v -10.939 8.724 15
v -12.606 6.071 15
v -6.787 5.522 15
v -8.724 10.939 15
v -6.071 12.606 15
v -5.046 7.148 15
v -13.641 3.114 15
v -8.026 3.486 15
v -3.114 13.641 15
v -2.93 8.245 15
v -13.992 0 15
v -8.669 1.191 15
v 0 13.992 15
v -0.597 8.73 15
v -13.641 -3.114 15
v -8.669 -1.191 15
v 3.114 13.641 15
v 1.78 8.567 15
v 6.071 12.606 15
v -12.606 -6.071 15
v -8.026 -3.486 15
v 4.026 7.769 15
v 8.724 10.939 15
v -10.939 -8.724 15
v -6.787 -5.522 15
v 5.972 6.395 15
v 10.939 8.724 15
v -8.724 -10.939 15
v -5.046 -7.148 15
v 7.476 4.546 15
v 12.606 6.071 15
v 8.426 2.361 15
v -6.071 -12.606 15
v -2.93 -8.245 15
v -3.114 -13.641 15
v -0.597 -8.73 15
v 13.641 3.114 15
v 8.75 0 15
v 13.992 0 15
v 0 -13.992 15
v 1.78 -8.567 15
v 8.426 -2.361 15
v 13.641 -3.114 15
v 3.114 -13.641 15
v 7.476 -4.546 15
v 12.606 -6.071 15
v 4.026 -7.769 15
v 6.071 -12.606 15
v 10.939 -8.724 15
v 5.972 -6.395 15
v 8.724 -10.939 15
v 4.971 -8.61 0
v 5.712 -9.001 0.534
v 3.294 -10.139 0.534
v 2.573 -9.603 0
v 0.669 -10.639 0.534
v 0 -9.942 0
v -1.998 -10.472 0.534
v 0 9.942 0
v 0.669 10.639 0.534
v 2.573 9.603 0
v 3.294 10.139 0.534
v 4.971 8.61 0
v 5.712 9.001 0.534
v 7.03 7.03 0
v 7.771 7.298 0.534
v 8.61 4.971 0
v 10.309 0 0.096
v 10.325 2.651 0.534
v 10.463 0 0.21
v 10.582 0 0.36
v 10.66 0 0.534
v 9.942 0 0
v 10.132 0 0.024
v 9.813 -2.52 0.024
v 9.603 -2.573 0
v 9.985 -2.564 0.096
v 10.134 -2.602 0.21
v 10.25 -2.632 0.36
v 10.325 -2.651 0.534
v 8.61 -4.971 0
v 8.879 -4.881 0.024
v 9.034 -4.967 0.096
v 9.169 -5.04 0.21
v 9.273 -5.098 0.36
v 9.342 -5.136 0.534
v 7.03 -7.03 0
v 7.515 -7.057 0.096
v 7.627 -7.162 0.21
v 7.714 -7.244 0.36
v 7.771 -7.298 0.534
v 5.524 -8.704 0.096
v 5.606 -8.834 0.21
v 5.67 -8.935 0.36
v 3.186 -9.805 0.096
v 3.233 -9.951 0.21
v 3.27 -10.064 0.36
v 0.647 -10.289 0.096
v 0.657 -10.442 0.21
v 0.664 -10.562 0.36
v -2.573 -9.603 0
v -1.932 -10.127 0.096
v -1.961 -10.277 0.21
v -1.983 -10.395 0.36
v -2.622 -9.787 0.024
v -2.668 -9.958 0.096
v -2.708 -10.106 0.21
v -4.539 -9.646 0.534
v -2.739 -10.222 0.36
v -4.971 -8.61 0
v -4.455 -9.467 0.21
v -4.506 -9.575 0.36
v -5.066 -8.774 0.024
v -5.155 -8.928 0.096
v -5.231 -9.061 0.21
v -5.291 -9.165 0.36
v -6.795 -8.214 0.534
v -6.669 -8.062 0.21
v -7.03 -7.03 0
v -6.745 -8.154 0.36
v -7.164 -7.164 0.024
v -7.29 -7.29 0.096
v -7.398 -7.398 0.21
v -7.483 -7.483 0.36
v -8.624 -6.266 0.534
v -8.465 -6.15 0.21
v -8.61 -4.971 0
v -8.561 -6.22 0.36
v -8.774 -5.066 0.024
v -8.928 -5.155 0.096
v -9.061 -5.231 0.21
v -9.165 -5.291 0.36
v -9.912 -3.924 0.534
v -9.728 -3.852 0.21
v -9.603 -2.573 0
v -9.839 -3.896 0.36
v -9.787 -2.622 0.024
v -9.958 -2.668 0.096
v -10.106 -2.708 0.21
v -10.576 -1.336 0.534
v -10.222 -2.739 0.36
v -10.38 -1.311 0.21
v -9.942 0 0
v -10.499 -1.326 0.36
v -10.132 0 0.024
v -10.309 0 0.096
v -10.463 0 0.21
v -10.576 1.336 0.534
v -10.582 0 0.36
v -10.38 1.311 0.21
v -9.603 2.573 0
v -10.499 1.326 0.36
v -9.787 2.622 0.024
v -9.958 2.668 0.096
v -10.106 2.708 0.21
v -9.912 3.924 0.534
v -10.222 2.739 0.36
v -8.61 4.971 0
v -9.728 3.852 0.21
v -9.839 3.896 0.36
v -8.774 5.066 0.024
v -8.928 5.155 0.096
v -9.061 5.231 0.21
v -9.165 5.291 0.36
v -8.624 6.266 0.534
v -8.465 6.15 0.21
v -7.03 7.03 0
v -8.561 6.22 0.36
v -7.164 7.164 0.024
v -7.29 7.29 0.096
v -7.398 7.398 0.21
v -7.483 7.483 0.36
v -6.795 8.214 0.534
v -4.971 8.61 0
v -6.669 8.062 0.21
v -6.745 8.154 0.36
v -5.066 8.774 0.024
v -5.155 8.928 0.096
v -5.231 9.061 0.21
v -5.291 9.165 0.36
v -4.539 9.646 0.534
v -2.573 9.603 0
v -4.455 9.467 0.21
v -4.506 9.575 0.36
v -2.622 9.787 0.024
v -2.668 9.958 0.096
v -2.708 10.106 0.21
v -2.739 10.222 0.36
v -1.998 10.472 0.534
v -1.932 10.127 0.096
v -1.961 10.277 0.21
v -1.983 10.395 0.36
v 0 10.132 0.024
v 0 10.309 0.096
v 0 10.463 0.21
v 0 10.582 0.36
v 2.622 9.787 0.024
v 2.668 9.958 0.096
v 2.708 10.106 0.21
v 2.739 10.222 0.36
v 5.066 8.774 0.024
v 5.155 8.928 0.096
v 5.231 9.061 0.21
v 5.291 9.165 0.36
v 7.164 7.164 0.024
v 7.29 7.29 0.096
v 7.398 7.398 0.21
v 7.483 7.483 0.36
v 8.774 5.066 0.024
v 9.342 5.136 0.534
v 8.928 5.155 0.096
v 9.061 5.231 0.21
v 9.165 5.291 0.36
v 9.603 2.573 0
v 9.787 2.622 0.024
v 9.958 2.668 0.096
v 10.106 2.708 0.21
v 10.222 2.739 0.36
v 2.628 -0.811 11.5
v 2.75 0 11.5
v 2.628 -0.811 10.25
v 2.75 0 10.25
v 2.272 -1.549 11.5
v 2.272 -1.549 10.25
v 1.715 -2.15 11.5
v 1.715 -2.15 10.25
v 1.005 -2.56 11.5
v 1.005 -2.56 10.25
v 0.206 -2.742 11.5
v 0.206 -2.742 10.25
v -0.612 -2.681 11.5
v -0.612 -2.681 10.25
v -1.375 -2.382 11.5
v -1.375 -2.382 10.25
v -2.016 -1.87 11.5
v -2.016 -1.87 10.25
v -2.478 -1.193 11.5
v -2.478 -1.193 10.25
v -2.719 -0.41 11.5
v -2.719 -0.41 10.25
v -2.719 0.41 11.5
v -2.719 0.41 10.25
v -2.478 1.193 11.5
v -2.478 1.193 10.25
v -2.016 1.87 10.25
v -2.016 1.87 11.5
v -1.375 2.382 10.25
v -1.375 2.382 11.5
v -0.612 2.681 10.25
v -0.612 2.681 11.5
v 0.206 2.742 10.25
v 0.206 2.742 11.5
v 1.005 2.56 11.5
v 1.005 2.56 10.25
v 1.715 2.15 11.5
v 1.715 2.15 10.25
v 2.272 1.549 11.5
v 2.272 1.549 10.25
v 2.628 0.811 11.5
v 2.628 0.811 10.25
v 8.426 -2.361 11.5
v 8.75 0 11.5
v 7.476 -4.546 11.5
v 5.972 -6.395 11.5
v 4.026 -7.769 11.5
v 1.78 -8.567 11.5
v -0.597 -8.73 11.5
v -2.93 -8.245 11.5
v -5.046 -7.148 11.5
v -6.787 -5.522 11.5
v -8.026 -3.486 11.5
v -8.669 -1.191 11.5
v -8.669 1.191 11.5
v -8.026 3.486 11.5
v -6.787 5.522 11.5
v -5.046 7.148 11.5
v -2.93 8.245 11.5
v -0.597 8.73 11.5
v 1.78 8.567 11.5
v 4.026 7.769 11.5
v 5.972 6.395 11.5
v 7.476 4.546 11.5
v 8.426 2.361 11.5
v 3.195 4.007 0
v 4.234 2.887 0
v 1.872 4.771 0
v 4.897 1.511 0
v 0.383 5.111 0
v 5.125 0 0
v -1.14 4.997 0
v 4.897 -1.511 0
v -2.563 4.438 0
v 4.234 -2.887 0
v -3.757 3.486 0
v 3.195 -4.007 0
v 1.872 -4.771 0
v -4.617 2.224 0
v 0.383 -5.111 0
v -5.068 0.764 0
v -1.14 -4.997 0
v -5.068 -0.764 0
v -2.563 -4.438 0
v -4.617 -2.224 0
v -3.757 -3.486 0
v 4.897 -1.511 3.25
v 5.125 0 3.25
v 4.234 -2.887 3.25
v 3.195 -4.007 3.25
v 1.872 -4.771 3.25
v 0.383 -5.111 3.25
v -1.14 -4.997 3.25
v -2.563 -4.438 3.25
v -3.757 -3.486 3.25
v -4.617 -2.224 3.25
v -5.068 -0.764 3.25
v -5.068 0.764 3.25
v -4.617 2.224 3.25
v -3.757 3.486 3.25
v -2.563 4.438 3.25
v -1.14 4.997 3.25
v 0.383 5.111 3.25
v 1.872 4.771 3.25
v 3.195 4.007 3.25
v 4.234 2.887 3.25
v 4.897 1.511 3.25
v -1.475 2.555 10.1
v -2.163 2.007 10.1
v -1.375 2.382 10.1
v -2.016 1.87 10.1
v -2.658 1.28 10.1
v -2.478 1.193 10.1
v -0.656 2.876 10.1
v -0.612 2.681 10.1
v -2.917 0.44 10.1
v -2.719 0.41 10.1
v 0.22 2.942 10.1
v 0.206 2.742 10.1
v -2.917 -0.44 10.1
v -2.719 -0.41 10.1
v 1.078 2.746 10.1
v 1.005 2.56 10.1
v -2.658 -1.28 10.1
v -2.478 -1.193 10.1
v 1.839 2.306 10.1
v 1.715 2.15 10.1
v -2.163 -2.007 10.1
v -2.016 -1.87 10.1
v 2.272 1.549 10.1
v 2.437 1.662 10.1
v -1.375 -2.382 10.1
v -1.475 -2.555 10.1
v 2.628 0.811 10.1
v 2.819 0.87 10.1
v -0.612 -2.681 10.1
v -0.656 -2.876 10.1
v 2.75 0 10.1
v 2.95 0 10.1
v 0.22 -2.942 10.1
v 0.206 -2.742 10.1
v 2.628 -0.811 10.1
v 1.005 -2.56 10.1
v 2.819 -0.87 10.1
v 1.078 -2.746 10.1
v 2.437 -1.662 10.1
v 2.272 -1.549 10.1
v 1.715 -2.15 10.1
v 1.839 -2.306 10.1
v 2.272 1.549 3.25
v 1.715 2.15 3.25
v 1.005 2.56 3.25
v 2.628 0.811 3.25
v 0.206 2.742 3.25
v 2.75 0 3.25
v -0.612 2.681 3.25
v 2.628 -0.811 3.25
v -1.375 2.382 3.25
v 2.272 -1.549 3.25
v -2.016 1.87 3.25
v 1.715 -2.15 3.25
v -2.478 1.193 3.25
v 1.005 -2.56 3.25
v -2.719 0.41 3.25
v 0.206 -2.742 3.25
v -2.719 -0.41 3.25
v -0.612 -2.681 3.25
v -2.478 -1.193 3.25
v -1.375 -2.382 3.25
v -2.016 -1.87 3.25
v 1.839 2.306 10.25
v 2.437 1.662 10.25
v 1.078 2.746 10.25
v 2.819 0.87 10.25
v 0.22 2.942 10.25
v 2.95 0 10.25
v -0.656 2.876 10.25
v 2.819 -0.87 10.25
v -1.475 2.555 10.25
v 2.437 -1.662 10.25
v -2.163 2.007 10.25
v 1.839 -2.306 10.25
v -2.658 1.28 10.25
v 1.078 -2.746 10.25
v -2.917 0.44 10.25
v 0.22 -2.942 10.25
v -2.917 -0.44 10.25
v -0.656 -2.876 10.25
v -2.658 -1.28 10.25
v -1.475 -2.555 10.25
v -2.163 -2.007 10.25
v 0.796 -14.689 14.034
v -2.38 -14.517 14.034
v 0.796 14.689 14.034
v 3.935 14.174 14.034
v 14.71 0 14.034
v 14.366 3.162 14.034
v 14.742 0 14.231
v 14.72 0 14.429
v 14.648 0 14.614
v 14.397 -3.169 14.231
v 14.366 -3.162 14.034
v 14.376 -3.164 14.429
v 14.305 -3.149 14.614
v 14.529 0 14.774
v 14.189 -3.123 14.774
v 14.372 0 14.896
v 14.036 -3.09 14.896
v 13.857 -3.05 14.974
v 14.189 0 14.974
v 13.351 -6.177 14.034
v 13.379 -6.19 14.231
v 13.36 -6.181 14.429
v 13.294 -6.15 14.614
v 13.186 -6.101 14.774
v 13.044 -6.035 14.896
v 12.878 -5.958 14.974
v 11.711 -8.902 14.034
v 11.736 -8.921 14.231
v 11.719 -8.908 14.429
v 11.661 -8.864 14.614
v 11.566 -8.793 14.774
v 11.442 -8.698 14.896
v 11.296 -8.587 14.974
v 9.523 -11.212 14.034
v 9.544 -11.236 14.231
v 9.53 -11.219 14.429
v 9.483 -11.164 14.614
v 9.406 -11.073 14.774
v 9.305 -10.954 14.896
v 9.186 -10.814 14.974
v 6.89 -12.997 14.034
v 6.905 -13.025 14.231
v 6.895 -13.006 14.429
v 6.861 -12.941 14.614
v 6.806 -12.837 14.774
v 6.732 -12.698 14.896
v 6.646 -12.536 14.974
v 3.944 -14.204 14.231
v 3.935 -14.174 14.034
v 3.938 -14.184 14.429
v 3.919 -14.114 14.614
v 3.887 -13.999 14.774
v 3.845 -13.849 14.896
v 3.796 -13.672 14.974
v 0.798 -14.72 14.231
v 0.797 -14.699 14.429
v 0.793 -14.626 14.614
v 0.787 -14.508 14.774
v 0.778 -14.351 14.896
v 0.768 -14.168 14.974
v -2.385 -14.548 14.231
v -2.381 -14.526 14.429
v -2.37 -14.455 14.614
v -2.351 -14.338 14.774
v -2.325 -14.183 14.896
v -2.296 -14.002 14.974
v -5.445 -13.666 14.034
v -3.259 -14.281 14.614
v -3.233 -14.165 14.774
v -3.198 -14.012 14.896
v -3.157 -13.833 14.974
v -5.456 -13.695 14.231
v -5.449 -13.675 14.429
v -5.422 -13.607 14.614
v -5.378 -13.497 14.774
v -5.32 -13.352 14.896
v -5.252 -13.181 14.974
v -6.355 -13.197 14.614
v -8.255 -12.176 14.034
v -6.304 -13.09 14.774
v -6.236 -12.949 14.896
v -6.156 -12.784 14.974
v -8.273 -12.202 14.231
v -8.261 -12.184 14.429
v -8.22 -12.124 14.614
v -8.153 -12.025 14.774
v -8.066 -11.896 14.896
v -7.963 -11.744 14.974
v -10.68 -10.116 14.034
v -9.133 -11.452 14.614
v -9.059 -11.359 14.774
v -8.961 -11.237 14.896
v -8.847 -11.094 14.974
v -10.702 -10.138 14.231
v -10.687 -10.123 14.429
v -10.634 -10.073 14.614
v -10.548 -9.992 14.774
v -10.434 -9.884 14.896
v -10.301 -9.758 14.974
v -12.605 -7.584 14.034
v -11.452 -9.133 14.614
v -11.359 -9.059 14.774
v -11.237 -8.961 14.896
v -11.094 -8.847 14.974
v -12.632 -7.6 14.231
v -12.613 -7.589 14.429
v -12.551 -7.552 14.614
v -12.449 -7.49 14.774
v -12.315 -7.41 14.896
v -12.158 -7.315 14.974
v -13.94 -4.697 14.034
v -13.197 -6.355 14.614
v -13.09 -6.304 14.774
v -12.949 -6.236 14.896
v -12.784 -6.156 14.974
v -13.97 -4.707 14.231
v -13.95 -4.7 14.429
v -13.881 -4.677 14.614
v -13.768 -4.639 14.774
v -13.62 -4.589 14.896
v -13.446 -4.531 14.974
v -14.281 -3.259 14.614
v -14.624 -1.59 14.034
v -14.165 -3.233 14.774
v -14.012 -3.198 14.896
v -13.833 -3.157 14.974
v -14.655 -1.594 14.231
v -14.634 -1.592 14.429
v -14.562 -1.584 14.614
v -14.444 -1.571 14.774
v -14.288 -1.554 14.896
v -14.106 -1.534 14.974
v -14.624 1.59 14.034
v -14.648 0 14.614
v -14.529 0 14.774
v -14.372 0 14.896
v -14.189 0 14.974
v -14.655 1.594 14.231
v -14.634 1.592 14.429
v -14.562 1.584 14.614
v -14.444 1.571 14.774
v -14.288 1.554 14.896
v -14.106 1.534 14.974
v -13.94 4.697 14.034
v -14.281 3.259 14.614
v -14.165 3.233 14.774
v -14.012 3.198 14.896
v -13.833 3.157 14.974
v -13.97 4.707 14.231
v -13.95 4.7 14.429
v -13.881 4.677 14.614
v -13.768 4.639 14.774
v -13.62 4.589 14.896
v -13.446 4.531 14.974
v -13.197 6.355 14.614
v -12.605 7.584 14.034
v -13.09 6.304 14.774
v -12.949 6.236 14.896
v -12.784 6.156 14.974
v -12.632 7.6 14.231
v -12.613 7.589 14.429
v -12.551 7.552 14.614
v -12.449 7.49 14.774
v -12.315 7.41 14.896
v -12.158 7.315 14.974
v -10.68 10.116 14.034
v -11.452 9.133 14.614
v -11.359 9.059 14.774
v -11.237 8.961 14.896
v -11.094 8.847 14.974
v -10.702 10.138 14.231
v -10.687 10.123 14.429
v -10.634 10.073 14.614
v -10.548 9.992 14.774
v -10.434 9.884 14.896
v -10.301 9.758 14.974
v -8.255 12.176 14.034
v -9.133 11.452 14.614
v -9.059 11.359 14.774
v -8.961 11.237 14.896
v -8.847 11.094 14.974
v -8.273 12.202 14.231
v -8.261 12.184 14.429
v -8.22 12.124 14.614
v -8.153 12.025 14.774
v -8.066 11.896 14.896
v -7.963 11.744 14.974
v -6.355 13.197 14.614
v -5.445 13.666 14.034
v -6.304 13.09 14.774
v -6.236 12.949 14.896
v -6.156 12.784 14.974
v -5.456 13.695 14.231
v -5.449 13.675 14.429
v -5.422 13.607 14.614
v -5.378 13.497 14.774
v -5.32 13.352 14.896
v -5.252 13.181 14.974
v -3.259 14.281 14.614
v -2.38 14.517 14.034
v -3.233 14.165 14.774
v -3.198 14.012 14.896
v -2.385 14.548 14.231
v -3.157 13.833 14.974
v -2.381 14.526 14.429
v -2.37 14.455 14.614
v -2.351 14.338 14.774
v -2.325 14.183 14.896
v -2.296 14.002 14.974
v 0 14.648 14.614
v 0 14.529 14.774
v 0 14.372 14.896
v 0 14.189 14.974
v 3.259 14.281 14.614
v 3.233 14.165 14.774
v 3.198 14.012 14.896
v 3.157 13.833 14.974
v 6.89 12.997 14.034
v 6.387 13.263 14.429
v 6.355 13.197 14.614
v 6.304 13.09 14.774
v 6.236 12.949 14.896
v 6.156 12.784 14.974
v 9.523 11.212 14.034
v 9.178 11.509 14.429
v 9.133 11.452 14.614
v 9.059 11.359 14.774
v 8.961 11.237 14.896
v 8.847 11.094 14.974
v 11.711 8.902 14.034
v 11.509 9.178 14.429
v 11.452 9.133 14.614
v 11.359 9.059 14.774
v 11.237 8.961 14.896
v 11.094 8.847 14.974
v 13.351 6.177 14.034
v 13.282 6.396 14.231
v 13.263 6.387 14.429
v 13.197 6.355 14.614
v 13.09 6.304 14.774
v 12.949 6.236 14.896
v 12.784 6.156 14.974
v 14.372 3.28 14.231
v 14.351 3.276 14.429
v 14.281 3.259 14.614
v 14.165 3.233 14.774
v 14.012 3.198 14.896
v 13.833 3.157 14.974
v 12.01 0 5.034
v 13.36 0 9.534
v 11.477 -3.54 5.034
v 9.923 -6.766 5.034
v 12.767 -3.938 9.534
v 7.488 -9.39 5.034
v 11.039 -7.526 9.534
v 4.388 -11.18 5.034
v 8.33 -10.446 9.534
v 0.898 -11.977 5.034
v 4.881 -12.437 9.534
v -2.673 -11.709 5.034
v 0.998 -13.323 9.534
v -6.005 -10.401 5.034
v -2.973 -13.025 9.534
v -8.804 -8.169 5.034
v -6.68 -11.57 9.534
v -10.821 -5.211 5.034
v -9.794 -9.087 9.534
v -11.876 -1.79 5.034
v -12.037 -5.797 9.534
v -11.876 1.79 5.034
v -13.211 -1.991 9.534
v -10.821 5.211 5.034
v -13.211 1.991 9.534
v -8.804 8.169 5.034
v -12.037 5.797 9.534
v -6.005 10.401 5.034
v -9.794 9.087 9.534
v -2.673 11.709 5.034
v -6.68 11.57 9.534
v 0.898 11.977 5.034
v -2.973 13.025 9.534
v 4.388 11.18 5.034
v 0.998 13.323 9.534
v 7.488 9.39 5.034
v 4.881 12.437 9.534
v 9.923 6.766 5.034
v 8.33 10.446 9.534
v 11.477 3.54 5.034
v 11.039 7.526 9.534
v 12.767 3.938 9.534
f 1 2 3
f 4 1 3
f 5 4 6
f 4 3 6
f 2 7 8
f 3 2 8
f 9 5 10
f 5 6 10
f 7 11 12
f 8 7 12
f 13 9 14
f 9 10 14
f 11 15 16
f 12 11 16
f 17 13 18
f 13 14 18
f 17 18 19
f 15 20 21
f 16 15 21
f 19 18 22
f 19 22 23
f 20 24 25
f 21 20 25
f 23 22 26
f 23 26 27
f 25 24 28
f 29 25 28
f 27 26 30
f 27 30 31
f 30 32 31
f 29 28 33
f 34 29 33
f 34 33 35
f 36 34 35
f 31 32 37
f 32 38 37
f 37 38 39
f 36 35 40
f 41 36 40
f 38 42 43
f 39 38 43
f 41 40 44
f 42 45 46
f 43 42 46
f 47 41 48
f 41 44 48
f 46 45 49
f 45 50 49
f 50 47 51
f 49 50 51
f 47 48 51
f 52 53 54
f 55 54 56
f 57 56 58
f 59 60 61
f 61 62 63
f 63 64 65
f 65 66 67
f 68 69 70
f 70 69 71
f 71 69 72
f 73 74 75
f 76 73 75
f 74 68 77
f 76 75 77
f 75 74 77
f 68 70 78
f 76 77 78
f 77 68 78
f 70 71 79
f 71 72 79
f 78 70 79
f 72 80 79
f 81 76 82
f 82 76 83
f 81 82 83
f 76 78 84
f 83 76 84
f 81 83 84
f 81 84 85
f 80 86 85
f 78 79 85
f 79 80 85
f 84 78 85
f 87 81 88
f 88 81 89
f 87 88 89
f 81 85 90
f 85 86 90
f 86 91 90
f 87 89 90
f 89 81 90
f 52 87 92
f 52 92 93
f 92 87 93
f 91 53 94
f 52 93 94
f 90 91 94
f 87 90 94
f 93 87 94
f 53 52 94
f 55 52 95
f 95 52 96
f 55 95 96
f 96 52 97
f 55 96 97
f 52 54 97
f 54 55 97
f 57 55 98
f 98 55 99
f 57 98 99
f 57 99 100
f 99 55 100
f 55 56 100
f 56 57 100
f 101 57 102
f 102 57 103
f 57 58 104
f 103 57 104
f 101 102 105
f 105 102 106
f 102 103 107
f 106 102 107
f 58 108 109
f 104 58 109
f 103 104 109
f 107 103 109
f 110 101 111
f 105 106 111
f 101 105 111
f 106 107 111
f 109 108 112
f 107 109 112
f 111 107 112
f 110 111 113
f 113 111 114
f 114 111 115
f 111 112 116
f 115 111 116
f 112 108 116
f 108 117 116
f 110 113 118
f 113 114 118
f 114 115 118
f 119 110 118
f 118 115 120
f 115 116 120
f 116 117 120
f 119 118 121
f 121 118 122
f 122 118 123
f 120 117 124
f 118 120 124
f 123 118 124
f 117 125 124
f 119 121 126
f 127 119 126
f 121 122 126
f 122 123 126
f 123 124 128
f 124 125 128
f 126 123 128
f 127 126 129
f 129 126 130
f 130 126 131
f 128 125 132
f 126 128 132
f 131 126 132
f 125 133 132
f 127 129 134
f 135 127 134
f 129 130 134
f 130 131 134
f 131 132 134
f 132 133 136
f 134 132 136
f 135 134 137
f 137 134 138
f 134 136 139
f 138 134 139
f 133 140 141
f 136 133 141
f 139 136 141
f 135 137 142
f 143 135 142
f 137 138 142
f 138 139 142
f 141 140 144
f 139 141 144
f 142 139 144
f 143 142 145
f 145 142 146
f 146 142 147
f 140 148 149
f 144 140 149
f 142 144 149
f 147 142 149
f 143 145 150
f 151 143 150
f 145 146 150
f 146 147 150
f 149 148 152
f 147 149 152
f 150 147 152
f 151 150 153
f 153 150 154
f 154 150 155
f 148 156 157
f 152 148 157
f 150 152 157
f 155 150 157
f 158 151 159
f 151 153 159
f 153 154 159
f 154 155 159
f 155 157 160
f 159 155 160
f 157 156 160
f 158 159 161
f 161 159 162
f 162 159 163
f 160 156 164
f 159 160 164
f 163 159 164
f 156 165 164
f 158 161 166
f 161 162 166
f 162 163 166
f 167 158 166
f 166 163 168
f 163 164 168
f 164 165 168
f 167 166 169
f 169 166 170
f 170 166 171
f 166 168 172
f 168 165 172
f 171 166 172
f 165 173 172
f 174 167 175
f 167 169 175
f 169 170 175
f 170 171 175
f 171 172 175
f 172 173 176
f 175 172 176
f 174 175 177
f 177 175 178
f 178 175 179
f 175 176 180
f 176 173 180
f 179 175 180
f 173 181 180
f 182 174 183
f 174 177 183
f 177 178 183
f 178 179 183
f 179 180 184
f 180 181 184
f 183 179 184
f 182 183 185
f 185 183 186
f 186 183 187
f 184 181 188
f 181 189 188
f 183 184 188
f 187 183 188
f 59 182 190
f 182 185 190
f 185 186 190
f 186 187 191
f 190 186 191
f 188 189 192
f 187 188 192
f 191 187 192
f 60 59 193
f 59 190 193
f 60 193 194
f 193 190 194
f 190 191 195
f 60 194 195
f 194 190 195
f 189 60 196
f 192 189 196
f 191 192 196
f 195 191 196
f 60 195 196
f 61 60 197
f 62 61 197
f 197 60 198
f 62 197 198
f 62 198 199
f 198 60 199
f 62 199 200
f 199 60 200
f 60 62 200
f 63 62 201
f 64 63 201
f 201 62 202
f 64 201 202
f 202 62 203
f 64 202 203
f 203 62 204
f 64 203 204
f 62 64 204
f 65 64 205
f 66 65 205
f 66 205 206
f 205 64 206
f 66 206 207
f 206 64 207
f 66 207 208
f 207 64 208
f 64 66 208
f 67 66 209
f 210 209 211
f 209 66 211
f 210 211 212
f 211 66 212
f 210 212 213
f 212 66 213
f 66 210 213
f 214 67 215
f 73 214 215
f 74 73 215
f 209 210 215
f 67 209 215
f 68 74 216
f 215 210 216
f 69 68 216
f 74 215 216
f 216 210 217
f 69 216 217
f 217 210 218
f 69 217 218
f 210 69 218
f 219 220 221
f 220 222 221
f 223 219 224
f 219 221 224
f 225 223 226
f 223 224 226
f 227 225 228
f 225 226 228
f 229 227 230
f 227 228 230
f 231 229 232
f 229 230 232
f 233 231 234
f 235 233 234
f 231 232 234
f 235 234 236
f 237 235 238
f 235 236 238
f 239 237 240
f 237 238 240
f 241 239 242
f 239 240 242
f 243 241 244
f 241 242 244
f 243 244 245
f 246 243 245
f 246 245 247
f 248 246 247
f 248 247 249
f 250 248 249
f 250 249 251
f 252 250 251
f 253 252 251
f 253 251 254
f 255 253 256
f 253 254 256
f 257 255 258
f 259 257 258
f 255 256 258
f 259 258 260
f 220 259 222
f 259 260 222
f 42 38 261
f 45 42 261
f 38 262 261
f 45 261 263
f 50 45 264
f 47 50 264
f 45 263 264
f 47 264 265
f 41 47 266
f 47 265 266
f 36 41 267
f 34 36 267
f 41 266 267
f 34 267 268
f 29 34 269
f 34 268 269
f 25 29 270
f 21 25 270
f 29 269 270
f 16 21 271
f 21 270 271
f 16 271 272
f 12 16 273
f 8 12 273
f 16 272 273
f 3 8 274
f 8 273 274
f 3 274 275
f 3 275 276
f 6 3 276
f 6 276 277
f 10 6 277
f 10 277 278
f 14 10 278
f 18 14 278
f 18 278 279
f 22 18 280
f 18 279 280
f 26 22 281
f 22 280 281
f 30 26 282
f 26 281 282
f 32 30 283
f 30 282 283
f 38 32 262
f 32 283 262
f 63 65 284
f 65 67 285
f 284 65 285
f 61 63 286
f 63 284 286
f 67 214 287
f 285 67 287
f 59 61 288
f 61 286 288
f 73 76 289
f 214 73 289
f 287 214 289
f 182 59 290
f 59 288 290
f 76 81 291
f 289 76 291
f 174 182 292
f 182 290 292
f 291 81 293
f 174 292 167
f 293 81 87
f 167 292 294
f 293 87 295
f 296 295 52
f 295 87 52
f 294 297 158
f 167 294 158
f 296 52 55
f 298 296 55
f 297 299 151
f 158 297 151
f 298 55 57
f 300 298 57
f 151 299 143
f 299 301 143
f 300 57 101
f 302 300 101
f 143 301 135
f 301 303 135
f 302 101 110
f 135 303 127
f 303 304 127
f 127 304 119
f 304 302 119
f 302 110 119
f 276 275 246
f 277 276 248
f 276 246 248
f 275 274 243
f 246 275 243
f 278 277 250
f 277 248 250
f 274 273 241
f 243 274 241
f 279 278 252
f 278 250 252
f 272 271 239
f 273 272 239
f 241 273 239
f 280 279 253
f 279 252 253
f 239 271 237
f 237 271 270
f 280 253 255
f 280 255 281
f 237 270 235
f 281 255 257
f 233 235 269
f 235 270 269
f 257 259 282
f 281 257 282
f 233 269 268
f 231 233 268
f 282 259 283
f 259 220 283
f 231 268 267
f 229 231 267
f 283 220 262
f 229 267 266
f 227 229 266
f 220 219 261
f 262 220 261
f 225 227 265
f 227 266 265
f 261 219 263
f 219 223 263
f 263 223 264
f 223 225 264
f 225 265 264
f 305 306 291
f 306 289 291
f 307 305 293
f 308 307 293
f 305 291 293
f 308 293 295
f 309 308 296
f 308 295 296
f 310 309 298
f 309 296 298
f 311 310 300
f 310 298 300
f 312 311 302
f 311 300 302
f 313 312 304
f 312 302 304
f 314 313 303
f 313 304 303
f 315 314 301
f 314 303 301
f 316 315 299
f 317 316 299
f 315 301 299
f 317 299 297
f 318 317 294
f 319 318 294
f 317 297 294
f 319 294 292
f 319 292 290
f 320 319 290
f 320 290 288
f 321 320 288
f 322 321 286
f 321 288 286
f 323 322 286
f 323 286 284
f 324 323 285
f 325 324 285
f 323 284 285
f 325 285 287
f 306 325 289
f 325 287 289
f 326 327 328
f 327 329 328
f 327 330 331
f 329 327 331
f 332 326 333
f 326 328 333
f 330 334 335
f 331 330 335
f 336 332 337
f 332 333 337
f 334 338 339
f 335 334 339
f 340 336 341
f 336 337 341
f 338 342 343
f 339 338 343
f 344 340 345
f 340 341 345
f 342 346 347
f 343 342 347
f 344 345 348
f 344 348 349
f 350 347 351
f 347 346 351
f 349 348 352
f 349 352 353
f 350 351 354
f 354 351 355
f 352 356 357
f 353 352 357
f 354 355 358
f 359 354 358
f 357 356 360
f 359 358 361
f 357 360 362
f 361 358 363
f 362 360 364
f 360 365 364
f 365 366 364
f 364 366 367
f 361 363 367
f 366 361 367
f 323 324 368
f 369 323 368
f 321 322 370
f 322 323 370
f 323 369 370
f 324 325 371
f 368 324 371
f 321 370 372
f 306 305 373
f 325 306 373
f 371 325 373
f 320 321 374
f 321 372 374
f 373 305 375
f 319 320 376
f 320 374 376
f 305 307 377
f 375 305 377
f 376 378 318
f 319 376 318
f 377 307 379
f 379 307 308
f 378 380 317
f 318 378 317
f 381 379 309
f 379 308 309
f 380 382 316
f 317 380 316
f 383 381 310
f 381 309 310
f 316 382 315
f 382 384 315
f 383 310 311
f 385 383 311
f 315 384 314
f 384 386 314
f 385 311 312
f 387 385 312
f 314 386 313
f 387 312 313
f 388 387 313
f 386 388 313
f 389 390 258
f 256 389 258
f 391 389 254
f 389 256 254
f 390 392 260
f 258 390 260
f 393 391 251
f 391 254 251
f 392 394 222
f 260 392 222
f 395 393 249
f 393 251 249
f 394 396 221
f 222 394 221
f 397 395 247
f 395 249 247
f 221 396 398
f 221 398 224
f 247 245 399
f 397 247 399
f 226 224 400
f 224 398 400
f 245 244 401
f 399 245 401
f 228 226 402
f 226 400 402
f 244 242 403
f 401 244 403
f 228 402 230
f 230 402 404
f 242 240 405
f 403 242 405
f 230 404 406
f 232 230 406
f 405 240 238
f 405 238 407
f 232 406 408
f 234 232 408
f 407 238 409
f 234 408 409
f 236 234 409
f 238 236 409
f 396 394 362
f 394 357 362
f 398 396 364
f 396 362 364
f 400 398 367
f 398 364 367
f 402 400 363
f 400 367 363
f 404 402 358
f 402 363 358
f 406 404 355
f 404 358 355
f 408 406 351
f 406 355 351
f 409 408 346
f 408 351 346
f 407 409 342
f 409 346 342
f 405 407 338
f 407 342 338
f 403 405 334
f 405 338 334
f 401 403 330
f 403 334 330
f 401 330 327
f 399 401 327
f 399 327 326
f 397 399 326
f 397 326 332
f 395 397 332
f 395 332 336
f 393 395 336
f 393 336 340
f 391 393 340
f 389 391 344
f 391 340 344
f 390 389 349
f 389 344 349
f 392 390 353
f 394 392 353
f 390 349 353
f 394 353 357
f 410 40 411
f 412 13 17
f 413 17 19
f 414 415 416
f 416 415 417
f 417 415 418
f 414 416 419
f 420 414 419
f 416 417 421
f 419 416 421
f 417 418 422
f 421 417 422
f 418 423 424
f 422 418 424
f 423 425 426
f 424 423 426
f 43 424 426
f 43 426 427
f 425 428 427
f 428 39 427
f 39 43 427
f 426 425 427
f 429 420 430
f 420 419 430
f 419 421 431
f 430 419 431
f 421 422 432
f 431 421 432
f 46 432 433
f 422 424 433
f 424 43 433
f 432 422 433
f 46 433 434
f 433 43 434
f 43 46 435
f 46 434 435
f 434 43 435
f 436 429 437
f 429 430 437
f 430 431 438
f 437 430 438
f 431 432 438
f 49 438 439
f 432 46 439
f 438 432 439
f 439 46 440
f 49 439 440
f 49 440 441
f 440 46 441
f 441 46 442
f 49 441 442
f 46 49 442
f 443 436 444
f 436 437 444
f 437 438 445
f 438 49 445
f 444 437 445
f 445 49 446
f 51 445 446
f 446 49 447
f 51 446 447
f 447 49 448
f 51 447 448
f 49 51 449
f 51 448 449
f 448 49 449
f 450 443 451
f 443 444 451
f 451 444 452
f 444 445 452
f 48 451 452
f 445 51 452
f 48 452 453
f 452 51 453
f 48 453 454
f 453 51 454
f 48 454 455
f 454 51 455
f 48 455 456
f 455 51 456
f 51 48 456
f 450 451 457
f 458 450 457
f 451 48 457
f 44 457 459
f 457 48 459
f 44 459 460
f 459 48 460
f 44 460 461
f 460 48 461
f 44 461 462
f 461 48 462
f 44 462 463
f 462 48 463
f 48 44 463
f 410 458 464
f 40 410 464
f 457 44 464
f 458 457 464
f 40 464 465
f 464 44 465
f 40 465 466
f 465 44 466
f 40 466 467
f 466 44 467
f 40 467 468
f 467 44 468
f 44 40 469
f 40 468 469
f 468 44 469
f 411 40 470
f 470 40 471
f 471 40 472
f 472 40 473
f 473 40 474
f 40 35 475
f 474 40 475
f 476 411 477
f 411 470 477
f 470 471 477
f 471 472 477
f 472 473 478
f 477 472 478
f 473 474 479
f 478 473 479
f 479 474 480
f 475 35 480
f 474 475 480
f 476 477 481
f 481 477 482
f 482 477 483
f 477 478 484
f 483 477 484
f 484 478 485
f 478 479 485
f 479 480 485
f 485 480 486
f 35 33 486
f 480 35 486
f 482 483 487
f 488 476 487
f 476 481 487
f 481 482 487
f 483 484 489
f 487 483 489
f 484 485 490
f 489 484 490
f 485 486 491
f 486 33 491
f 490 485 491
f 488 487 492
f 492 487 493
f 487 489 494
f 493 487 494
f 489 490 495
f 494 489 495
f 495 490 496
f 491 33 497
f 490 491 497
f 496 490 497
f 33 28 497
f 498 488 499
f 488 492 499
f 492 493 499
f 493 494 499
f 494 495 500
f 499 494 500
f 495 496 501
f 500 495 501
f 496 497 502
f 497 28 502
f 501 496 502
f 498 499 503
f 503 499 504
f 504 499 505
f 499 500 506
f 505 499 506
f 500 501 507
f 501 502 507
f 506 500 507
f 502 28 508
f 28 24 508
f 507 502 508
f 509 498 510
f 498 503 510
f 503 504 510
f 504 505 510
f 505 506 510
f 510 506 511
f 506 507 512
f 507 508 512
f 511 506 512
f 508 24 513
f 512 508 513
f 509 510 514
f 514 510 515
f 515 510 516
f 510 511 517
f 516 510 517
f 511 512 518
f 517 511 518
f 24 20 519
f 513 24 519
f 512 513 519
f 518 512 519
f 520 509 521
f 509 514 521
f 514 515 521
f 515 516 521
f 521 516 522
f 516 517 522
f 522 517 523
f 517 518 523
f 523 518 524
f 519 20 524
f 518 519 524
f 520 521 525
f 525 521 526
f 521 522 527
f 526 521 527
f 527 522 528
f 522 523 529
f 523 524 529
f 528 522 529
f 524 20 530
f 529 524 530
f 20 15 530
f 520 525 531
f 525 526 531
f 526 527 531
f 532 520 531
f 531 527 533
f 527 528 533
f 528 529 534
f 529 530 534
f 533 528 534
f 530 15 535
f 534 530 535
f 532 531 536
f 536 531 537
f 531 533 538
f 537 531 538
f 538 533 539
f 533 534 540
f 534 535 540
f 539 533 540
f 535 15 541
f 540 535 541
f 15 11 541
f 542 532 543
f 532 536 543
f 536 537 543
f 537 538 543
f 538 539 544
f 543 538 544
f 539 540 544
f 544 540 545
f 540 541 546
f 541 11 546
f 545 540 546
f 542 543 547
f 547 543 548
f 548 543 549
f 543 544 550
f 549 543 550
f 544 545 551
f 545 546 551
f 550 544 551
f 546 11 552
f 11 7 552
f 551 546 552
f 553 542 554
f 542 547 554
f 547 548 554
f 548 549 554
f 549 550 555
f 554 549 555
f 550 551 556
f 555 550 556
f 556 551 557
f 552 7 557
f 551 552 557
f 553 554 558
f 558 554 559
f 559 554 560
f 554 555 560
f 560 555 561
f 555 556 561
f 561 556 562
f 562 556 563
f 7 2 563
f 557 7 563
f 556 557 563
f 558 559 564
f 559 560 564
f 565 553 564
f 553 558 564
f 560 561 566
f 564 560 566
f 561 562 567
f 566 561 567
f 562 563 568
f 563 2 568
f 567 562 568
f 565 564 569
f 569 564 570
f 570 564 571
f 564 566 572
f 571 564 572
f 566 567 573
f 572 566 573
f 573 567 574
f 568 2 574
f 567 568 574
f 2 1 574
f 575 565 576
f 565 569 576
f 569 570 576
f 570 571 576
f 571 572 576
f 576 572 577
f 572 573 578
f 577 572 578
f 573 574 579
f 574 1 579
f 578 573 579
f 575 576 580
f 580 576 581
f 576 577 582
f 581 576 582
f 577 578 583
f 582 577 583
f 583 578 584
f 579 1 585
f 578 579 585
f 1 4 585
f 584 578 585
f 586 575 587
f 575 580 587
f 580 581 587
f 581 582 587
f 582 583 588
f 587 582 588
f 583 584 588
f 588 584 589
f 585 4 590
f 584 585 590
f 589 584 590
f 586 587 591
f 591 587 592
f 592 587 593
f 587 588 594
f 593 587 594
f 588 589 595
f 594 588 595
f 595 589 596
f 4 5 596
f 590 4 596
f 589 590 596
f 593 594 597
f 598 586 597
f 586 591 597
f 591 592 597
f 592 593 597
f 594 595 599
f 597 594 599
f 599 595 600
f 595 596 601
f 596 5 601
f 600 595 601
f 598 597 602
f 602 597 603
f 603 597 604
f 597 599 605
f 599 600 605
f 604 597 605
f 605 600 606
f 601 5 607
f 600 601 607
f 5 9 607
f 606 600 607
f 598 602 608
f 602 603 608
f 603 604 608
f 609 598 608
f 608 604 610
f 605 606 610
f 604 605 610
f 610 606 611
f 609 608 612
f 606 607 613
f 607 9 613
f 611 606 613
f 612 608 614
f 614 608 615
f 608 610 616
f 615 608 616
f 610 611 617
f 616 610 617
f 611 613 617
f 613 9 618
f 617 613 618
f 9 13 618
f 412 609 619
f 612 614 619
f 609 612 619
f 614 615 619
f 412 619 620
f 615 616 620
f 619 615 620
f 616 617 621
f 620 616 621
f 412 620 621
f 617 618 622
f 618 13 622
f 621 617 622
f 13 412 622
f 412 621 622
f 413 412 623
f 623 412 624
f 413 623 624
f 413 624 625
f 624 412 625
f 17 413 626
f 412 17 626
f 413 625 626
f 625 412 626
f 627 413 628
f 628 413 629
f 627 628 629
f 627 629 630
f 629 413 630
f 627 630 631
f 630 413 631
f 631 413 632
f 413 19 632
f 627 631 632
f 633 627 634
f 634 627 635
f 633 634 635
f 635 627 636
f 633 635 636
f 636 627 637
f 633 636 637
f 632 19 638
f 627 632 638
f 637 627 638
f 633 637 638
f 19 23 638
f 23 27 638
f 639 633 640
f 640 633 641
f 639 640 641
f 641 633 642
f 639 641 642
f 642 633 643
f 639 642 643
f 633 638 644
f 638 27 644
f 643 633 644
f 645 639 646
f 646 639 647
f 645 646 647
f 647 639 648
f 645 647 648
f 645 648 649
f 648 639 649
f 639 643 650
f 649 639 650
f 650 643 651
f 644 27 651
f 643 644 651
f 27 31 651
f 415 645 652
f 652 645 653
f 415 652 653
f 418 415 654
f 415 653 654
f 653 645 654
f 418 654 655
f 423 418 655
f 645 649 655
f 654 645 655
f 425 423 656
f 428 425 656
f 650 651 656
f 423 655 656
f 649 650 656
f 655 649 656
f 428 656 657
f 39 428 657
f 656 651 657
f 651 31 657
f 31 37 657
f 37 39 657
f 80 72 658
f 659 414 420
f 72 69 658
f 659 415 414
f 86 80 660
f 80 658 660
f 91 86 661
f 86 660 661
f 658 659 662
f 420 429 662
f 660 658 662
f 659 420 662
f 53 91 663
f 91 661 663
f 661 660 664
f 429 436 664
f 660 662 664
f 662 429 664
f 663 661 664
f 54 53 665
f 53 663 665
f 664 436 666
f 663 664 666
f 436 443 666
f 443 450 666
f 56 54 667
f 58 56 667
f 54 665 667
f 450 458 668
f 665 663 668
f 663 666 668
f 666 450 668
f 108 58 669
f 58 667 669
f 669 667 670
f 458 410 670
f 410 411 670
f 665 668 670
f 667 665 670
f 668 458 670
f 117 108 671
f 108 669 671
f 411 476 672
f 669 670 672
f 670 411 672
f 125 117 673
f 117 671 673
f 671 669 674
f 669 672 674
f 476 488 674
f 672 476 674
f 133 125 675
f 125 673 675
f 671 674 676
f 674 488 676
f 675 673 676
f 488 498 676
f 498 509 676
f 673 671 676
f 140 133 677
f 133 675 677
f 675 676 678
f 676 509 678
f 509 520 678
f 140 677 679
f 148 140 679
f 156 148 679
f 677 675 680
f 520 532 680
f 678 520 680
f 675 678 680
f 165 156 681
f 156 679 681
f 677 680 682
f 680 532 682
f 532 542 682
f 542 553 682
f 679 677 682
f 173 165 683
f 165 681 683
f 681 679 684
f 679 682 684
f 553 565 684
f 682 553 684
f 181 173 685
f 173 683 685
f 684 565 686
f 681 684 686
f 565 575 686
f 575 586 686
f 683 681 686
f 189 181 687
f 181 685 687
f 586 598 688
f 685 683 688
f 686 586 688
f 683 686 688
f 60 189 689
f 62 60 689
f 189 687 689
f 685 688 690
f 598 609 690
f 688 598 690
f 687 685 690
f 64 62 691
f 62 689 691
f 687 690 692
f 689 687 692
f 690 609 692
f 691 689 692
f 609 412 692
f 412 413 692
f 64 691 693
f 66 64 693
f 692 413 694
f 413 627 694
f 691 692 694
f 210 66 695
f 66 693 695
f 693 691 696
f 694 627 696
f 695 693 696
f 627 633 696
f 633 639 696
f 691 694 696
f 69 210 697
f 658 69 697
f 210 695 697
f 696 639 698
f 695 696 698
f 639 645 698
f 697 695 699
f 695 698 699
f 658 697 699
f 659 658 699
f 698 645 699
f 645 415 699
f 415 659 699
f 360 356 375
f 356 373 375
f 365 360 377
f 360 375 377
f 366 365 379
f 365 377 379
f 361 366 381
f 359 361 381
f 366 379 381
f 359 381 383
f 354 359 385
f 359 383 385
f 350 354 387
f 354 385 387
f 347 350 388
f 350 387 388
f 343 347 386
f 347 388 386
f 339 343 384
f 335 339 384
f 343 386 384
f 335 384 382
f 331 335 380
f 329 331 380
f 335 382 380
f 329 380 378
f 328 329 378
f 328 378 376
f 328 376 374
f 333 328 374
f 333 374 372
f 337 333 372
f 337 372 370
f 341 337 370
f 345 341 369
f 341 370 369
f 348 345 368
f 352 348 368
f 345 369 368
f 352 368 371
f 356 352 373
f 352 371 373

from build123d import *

# Parameters (mm, degrees)
FILLET1_R = 0.75


with BuildPart() as part:
    # Sketch2 → Revolve1 (revolve)
    with BuildSketch(Plane(origin=(0, 0, 0), x_dir=(1, 0, 0), z_dir=(0, 1, 0))):
        Polygon((5.125, 0), (10.5, 0), (15, -15), (8.75, -15), (8.75, -11.5), (2.75, -11.5), (2.75, -10.25), (2.95, -10.25), (2.95, -10.1), (2.75, -10.1), (2.75, -3.25), (5.125, -3.25), align=None)
    revolve(axis=Axis((0, 0, 0), (0, 0, -1)))

    # Fillet1
    fillet1_edges = [part.edges().sort_by_distance(p)[0] for p in [
        (-10.5, 0, 0),
        (-15, 0, 15),
    ]]
    fillet(fillet1_edges, radius=FILLET1_R)


solid = part.part
